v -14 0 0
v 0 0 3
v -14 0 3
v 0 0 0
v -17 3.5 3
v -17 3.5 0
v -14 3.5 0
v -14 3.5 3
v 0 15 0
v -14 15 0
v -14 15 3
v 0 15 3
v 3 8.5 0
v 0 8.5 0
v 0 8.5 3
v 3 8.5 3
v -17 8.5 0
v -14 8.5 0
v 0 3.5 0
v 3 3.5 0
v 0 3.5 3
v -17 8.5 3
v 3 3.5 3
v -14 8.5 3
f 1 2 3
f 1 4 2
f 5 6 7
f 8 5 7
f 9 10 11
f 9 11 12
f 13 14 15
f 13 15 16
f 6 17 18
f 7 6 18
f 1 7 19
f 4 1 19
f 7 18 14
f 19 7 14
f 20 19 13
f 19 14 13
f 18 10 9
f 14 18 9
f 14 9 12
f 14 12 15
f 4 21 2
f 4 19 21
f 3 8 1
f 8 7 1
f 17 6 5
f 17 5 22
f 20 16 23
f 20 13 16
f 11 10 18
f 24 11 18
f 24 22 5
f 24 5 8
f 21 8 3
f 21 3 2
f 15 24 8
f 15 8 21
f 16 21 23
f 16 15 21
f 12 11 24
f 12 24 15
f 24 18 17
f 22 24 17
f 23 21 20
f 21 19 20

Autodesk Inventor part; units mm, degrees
ref_plane "YZ Plane" through (0, 0, 0) normal (1, 0, 0) x (0, 1, 0)
ref_plane "XZ Plane" through (0, 0, 0) normal (0, 1, 0) x (-1, 0, 0)
ref_plane "XY Plane" through (0, 0, 0) normal (0, 0, 1) x (1, 0, 0)
sketch "Boceto2" plane through (0, 0, 0) normal (0, 0, 1) x (1, 0, 0)
  line L0 (-14, 15) -> (0, 15)
  line L1 (3, 8.5) -> (3, 3.5)
  line L2 (0, 0) -> (-14, 0)
  line L3 (-17, 3.5) -> (-17, 8.5)
  line L4 (-14, 8.5) -> (-17, 8.5)
  line L5 (-17, 3.5) -> (-14, 3.5)
  line L6 (0, 8.5) -> (3, 8.5)
  line L7 (0, 3.5) -> (3, 3.5)
  line L8 (-14, 15) -> (-14, 8.5)
  line L9 (-14, 3.5) -> (-14, 0)
  line L10 (0, 15) -> (0, 8.5)
  line L11 (0, 3.5) -> (0, 0)
  point P0 (1.5, 3.5)
  dimension "d4" = 20
  dimension "d5" = 15
  dimension "d9" = 5
  dimension "d10" = 3
  dimension "d11" = 3
  dimension "d12" = 5
  dimension "d15" = 3.5
extrude "Extrusión1" add sketch "Boceto2" along normal blind 3
properties part number "abajo"
